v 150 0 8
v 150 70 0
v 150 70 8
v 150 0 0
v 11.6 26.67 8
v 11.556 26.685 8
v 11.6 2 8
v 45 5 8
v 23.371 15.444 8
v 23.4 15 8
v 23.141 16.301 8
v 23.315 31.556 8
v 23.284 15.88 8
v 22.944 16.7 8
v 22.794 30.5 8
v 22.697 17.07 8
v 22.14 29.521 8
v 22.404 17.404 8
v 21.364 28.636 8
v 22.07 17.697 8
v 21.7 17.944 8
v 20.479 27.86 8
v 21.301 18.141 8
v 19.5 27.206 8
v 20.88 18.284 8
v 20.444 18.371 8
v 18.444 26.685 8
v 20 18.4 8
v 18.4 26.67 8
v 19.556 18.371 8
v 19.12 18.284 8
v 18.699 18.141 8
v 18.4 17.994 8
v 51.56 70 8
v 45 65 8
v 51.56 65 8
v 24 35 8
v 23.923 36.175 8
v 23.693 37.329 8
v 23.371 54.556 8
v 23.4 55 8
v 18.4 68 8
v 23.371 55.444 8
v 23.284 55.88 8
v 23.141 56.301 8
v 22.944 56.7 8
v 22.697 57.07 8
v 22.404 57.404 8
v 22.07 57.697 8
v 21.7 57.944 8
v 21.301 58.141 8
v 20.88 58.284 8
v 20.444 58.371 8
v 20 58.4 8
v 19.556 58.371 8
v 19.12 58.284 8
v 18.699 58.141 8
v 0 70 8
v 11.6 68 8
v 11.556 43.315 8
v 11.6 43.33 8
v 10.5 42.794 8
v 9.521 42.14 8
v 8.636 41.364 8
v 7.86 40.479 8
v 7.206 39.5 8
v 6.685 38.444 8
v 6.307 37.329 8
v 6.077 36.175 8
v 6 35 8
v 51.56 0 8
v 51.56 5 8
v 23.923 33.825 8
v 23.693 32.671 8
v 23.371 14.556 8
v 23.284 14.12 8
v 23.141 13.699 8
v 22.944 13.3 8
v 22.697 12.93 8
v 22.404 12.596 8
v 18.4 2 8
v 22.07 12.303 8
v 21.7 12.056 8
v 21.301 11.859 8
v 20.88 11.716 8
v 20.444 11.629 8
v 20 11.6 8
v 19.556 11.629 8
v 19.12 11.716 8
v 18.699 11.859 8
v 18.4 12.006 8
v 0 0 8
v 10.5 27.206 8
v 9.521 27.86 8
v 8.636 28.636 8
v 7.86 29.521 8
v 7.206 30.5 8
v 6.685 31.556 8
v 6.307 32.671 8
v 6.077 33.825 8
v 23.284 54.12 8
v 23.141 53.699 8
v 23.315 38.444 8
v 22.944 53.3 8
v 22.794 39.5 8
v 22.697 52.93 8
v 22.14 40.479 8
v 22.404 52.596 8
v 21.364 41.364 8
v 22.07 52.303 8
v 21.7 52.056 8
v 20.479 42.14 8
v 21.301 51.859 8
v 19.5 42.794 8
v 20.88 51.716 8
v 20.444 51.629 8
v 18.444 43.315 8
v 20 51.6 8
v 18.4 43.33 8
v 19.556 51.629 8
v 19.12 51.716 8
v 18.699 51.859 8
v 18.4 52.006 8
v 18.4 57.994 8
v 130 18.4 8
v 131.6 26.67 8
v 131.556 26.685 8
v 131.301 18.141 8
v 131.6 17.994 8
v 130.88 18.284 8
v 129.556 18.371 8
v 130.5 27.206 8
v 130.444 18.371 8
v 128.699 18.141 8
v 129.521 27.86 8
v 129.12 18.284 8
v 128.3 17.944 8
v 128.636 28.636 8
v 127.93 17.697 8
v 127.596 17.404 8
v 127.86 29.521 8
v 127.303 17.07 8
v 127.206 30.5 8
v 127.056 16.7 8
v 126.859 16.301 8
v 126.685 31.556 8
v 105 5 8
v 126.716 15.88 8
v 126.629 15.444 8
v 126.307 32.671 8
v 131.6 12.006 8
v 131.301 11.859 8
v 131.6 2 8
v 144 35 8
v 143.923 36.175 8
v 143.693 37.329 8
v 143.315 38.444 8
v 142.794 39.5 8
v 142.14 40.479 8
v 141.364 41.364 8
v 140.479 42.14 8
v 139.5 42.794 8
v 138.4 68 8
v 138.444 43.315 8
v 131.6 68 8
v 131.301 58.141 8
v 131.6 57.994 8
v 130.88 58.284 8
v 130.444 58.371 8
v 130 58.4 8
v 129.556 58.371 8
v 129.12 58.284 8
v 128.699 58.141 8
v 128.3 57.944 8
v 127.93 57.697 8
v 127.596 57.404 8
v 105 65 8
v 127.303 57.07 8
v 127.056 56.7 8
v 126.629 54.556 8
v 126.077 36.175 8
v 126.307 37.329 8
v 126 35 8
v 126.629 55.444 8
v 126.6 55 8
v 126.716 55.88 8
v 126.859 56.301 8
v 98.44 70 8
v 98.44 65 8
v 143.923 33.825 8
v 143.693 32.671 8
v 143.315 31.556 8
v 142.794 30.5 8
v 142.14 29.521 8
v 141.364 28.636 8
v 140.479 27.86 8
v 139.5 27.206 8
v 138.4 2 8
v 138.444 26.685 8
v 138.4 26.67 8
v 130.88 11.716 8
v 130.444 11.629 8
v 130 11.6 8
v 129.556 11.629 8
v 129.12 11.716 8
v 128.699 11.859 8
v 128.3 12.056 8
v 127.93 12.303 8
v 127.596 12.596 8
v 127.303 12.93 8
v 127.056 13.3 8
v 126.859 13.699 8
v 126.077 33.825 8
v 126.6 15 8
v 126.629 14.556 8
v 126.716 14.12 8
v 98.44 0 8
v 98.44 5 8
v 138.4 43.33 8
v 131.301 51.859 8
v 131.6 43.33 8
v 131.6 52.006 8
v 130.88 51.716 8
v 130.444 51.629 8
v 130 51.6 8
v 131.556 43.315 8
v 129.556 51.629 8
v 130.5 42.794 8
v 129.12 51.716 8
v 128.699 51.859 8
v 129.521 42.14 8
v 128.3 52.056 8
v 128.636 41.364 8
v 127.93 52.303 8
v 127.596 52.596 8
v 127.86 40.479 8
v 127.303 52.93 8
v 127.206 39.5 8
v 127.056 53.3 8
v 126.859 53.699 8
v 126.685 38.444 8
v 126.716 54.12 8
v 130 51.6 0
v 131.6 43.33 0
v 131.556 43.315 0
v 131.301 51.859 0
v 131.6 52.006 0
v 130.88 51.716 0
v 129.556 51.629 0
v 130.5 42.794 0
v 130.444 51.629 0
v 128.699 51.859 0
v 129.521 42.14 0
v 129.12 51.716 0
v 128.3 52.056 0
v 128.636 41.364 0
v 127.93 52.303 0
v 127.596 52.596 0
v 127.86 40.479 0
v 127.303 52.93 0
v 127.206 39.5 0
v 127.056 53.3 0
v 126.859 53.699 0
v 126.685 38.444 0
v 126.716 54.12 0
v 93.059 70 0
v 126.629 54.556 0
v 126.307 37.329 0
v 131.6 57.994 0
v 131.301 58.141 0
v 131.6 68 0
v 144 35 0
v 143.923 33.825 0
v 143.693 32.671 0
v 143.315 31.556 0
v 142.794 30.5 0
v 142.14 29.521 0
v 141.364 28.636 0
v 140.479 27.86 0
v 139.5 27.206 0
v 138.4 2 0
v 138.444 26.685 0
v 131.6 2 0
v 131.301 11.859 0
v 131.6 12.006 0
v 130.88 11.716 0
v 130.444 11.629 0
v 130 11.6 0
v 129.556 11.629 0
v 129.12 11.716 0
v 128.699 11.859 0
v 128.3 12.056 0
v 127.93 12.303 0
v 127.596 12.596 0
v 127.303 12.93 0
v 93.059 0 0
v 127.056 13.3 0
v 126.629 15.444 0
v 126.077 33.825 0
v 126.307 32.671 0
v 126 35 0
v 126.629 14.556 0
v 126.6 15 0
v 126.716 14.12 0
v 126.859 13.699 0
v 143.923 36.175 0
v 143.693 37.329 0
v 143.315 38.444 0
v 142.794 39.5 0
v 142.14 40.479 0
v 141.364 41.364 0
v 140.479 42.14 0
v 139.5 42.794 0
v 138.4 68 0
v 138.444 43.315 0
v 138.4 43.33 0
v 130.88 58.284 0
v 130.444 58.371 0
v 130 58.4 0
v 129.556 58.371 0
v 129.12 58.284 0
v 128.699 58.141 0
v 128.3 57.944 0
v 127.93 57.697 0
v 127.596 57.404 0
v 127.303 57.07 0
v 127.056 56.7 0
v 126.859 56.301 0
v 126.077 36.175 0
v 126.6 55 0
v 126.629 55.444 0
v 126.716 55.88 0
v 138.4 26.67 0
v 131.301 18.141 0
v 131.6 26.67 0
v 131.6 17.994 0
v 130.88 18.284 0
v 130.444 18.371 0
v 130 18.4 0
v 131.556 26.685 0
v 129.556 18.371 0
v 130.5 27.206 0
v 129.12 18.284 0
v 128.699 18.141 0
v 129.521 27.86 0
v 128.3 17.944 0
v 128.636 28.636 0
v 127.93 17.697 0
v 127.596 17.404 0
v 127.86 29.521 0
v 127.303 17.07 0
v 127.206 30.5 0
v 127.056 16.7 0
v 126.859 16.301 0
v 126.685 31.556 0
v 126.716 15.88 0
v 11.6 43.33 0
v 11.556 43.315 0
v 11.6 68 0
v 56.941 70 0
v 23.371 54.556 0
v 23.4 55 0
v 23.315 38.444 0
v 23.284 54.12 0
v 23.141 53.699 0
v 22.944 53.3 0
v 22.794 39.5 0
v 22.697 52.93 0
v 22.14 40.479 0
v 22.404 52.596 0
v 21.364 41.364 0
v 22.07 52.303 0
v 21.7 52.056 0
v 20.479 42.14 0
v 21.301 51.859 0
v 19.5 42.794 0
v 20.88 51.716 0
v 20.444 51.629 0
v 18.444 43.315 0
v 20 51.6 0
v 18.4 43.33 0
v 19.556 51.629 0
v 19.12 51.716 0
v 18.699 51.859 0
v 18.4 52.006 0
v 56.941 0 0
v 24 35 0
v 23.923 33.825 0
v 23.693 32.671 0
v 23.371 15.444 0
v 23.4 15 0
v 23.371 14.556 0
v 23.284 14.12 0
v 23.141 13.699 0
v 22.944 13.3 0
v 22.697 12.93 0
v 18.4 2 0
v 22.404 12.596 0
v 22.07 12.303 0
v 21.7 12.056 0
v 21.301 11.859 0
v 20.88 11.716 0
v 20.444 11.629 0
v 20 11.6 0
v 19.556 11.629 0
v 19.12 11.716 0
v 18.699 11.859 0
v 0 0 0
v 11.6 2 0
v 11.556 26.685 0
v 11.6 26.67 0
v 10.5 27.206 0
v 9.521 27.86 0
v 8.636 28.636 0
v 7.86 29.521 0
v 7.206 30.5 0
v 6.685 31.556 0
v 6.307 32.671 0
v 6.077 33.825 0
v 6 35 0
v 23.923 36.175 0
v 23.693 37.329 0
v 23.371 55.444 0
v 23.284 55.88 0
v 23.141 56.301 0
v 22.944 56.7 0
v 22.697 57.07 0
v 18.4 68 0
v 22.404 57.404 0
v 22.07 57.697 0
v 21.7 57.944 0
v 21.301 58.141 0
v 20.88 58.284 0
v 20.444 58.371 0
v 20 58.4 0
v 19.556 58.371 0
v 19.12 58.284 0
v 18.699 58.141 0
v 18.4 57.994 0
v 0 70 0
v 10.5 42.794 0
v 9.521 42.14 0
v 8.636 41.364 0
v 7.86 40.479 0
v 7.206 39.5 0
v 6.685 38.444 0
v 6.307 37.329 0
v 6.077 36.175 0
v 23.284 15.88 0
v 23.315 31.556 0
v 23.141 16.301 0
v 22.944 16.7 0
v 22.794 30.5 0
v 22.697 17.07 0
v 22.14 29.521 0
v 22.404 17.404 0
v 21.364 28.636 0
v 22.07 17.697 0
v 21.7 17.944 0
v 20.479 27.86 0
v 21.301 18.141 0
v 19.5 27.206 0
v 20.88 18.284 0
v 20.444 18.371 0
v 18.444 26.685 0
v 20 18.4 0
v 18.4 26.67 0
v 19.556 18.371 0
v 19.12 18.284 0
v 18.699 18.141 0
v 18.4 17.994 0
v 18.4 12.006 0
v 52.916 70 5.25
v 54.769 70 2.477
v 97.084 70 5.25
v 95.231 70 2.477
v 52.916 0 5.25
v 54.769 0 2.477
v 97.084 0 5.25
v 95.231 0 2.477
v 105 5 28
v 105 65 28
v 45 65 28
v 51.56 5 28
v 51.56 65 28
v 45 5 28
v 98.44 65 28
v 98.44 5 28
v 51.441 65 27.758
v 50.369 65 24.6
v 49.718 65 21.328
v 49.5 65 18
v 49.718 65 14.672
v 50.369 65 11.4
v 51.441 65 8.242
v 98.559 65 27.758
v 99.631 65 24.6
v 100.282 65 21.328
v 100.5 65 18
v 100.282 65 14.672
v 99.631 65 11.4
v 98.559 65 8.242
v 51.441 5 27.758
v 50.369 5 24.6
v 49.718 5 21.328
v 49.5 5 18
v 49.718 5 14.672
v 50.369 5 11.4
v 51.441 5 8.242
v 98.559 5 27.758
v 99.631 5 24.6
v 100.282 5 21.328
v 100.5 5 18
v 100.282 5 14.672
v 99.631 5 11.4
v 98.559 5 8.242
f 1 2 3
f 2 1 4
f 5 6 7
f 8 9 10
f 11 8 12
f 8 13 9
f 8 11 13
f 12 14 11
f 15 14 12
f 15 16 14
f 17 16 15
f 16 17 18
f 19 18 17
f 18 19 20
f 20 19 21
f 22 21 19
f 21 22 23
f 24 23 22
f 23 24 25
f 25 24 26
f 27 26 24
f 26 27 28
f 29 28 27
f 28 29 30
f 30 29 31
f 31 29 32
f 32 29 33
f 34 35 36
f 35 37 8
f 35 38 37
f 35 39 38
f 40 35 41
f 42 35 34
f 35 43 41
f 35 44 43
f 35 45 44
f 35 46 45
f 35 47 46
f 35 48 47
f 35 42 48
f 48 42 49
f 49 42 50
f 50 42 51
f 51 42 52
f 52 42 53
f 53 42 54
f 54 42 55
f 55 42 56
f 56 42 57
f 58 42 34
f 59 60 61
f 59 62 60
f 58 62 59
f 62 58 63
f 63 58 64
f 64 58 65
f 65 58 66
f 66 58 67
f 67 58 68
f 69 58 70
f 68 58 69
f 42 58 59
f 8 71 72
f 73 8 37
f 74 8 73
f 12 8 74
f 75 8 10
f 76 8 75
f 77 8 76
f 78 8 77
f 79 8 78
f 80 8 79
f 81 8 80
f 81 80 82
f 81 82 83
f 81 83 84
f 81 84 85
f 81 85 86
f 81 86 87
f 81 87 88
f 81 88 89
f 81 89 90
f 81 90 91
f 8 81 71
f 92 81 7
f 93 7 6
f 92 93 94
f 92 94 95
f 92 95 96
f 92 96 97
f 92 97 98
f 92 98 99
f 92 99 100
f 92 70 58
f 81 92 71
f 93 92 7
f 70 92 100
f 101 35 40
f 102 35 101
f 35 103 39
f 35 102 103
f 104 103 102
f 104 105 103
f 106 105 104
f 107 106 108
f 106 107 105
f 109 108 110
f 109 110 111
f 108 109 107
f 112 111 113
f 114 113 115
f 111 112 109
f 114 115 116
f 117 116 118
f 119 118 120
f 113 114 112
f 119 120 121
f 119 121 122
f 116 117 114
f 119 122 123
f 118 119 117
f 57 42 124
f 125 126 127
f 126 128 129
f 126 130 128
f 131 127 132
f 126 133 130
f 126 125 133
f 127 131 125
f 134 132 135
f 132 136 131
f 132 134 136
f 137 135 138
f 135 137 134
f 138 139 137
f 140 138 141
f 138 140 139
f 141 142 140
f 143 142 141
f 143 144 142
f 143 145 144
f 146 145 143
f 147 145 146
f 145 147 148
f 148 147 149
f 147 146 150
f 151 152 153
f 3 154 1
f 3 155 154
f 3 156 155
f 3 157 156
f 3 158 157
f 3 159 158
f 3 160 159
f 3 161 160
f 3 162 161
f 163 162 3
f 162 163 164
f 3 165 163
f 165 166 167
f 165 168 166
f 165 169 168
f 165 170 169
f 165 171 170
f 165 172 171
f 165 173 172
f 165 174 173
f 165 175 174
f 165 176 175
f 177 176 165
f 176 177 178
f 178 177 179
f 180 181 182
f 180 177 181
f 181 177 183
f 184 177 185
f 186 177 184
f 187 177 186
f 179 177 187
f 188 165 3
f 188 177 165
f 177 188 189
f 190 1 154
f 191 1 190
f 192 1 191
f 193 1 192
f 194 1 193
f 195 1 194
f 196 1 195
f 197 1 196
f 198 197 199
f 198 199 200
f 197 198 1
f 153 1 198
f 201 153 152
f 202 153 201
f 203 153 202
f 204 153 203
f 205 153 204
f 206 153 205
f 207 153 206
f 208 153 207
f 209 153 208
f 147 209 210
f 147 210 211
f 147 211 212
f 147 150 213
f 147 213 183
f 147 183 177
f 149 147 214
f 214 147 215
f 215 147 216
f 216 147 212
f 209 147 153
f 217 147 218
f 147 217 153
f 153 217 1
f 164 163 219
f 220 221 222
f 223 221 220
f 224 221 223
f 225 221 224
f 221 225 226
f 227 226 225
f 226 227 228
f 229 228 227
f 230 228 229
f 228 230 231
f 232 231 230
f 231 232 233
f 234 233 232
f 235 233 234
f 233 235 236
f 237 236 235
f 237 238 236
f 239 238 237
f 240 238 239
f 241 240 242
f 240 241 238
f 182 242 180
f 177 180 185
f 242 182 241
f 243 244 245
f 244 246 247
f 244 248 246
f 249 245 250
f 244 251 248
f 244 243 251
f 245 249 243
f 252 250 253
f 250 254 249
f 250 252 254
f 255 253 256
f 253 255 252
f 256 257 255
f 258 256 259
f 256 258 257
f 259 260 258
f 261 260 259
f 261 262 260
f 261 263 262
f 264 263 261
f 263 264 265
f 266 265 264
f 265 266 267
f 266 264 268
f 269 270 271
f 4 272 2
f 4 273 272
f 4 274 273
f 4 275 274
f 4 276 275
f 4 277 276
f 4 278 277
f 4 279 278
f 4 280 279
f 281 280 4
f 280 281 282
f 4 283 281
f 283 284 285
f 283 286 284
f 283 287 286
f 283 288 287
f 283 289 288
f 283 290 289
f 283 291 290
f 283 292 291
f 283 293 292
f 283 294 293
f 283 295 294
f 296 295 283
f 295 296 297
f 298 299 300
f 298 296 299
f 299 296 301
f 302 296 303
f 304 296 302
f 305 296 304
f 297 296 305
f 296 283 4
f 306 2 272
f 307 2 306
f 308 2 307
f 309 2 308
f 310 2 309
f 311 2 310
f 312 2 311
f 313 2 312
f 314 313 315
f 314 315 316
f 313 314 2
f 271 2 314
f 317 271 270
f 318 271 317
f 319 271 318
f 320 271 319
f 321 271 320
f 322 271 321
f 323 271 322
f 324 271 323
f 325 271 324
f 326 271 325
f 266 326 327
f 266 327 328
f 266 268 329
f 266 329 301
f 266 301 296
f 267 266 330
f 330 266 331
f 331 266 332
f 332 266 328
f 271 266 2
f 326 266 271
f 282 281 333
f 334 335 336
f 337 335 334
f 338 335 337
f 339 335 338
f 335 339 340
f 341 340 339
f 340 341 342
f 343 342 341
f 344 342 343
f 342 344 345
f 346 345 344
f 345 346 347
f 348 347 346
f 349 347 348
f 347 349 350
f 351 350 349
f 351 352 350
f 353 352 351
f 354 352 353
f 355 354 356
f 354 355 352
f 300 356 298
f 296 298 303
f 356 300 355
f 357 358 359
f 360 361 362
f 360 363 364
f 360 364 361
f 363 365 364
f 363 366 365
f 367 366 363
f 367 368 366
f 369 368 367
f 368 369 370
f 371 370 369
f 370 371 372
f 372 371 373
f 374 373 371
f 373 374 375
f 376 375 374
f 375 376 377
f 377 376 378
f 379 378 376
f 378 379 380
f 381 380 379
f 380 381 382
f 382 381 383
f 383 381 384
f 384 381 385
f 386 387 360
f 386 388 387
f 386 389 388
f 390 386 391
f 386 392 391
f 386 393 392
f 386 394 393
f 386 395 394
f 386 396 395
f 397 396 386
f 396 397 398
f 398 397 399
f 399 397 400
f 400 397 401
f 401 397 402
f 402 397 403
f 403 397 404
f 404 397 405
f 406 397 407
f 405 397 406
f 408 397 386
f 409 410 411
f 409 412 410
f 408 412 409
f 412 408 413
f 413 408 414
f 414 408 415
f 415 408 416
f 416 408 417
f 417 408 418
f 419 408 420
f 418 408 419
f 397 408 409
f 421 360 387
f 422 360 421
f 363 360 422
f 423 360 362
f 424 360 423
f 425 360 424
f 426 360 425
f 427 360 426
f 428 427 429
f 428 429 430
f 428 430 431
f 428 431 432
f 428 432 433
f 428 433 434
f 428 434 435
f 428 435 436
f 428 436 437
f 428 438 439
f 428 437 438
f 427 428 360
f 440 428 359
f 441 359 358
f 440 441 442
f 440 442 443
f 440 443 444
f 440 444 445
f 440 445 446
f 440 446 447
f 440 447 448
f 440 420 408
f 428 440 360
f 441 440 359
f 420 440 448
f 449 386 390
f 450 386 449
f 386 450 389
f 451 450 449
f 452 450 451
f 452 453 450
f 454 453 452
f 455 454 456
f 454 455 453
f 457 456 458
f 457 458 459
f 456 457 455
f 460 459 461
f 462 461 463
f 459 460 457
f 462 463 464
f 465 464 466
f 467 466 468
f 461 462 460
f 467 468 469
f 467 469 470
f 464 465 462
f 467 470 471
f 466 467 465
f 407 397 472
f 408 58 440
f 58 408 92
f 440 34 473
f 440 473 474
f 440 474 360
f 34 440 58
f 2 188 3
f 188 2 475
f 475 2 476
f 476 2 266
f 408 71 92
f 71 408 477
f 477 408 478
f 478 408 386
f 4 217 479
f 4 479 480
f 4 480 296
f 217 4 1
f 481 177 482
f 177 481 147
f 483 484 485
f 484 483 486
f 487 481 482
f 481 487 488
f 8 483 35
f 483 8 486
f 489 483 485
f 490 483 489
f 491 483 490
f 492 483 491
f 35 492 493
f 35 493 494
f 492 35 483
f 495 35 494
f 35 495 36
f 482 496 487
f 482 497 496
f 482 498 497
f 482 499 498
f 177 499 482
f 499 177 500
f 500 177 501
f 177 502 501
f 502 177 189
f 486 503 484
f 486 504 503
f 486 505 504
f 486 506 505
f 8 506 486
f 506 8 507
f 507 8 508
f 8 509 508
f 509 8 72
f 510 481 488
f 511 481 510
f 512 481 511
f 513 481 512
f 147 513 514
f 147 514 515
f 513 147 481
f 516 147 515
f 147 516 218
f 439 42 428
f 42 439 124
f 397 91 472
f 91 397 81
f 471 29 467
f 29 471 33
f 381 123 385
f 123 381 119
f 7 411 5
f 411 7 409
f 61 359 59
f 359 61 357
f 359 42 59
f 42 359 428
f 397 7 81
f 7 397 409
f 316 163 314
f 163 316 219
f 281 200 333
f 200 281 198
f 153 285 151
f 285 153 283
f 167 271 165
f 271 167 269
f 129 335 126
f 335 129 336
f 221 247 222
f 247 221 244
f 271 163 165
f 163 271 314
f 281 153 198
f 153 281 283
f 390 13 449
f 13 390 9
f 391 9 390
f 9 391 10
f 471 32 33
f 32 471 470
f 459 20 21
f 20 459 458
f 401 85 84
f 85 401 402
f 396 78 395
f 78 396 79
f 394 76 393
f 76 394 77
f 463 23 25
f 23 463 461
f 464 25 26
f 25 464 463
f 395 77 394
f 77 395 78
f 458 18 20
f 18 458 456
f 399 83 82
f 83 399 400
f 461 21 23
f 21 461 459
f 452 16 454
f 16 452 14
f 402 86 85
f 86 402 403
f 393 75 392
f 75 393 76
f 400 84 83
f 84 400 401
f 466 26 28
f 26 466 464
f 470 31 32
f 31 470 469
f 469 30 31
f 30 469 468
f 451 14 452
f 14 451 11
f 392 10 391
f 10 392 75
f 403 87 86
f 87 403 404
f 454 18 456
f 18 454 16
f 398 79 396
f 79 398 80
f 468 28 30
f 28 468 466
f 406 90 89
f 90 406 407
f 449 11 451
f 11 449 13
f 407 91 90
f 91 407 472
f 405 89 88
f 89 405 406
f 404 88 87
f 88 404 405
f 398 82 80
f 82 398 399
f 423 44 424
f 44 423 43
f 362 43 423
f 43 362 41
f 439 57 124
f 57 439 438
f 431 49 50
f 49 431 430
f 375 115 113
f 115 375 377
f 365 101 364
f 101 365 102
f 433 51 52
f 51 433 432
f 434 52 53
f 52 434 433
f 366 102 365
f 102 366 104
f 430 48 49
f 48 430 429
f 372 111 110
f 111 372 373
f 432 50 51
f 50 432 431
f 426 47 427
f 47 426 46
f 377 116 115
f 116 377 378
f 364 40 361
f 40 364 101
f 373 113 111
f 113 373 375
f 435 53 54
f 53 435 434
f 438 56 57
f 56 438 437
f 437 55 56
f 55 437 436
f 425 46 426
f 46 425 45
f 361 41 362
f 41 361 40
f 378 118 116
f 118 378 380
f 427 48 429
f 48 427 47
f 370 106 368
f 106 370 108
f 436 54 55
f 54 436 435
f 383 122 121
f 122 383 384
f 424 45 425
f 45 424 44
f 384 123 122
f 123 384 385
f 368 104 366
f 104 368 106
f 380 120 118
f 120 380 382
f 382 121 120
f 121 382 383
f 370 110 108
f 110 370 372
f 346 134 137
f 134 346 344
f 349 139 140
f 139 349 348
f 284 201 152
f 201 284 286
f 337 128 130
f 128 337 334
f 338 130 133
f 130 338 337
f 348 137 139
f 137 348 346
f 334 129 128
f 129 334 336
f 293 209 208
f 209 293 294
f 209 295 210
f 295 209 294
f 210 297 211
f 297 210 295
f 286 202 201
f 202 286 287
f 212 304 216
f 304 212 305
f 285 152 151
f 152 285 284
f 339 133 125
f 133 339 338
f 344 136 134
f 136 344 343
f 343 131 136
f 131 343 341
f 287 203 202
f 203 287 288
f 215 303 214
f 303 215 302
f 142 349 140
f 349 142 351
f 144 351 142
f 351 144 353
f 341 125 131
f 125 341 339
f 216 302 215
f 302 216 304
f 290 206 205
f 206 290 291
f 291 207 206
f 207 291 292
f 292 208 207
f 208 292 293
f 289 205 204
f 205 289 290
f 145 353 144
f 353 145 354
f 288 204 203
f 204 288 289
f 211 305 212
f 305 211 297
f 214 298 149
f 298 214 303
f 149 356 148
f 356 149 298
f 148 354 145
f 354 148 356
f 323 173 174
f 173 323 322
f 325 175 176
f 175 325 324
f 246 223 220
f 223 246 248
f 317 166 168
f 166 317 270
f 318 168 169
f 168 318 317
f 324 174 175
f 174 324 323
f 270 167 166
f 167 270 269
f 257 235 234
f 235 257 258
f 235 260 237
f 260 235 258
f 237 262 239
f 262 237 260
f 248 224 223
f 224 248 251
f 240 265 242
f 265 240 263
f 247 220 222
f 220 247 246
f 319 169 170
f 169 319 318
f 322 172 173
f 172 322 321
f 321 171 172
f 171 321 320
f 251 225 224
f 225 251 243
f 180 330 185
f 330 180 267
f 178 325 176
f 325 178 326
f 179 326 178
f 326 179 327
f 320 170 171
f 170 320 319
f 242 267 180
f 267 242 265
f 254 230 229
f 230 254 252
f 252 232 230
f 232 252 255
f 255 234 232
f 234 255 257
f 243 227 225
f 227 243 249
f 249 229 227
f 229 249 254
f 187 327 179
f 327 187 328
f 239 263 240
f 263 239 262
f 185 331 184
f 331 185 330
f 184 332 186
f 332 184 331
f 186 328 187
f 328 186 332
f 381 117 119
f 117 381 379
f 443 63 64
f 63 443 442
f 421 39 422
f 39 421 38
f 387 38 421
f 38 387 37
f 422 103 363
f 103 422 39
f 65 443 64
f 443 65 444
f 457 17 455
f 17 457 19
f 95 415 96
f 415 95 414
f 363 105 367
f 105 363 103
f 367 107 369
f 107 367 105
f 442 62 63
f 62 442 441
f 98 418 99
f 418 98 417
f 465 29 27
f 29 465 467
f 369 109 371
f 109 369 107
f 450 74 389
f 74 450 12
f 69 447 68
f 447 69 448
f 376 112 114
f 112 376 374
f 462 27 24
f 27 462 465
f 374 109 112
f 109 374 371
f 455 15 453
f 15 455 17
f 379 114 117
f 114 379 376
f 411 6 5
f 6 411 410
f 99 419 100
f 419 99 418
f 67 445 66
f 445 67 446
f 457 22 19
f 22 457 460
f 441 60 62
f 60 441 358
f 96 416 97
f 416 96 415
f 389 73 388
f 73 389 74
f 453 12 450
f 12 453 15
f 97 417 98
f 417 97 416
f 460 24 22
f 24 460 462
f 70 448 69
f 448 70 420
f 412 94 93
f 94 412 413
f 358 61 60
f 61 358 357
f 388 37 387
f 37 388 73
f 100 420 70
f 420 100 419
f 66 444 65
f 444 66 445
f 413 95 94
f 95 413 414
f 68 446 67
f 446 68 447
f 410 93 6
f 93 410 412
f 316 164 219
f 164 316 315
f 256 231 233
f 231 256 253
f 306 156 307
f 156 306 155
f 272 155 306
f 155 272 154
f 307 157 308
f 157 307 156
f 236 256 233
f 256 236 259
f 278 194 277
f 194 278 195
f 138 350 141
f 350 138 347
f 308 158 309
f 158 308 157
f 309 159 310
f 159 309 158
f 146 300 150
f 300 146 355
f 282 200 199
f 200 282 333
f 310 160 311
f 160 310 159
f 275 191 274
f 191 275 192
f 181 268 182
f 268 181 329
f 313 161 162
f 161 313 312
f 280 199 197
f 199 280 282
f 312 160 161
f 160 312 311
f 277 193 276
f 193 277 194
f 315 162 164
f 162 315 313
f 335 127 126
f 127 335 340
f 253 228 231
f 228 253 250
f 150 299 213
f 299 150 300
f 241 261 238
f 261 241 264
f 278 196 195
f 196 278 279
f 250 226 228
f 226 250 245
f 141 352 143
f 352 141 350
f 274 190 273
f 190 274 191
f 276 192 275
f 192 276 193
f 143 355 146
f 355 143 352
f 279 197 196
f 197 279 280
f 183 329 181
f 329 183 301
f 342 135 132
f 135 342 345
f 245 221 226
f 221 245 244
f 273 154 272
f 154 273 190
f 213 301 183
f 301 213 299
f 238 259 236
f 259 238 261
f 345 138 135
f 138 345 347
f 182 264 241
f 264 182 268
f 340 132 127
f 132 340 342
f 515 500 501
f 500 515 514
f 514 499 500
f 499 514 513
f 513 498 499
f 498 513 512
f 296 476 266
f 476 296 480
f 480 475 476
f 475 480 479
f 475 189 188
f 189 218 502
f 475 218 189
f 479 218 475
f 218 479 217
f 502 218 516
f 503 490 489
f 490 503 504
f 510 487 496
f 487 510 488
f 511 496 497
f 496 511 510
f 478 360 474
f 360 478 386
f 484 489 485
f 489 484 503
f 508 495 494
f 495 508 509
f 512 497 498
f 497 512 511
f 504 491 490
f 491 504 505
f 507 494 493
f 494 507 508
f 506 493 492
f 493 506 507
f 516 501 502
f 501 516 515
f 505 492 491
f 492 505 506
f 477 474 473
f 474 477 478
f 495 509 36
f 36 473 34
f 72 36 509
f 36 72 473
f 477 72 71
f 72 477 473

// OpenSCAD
/*
 * mounting_brackets.scad
 * Mounting Brackets for Common-Mode Choke Enclosures
 * TM-CMC-001 Rev A
 * Material: ASA (outdoor) or PETG (indoor only)
 * Print bed: 200 × 200 mm; all parts fit without support
 *
 * Bracket types:
 *   1. U-bolt mast bracket (1"–2.5" mast, adjustable)
 *   2. Flat surface / wall mount bracket with cable routing
 *   3. Tower climbing bracket (clamp-on step bolt style)
 *   4. Coax strain relief clamp (for feedline at choke entry)
 *   5. Ferrite stack retainer clip (keeps stacked toroids aligned)
 *   6. Snap-on bead rail (holds 8–12 beads in line on coax)
 */

$fn = 48;

D_M4   = 4.5;
D_M4_HS= 6.5;
D_M6   = 6.8;
D_M8   = 8.5;

// ── 1. U-BOLT MAST BRACKET ────────────────────────────────────────────────────
// Attaches the choke enclosure (or bare coil) to a round mast.
// Accommodates mast diameter 25mm (1") to 63mm (2.5").
// Two M6 U-bolts thread through slots; tighten with wing nuts for field use.
// Enclosure mounts to top face via 4× M6 bolts matching flange pattern.

module ubolt_mast_bracket(mast_d = 50) {
    PLATE_L = 150;
    PLATE_W = 70;
    PLATE_T = 8;
    SADDLE_H = 20;
    BOLT_PITCH_X = 120;   // spacing between U-bolt legs
    ENC_BOLT_PITCH = 110; // must match enclosure flange M6 pattern

    difference() {
        union() {
            // Flat back plate
            cube([PLATE_L, PLATE_W, PLATE_T]);
            // Mast saddle boss (extends inward)
            translate([PLATE_L/2 - mast_d/2 - 5, PLATE_W/2 - mast_d/2 - 5, PLATE_T])
                cube([mast_d + 10, mast_d + 10, SADDLE_H]);
        }

        // Mast cutout (semi-cylinder into saddle)
        translate([PLATE_L/2, -0.1, PLATE_T + SADDLE_H/2])
            rotate([-90, 0, 0])
            cylinder(d=mast_d + 1.0, h=PLATE_W + 0.2);

        // U-bolt slots (×2, centered on mast center)
        for (dx=[-BOLT_PITCH_X/2, BOLT_PITCH_X/2])
            translate([PLATE_L/2 + dx - D_M6/2, PLATE_W/2 - mast_d/2 - 8, -0.1])
                cube([D_M6, mast_d + 16, PLATE_T + 0.2]);

        // Enclosure mounting holes ×4
        for (pos=[[(PLATE_L-ENC_BOLT_PITCH)/2,    15],
                  [(PLATE_L-ENC_BOLT_PITCH)/2,    PLATE_W-15],
                  [(PLATE_L+ENC_BOLT_PITCH)/2,    15],
                  [(PLATE_L+ENC_BOLT_PITCH)/2,    PLATE_W-15]])
            translate([pos[0], pos[1], -0.1])
                cylinder(d=D_M6, h=PLATE_T+0.2);

        // Lightening holes
        for (x=[15, PLATE_L-15])
            translate([x, PLATE_W/2, -0.1])
                cylinder(d=18, h=PLATE_T+0.2);

        // Corner cable tie slots (route coax along bracket)
        for (y=[5, PLATE_W-5])
            translate([PLATE_L/2-1, y-2, -0.1])
                cube([2, 4, PLATE_T+0.2]);
    }
}

// ── 2. FLAT SURFACE / WALL MOUNT BRACKET ─────────────────────────────────────
// L-bracket for mounting choke enclosure on flat surface (wall, roof penetration,
// equipment rack, or field-day table edge).
// Horizontal arm: attaches to enclosure
// Vertical arm: attaches to wall with M6 lag bolts or anchors

module wall_mount_bracket() {
    H_ARM_L = 100;   // horizontal arm length
    V_ARM_L = 100;   // vertical arm length
    ARM_W   =  70;
    ARM_T   =   8;
    GUSSET  =  30;

    union() {
        // Horizontal arm
        difference() {
            cube([H_ARM_L, ARM_W, ARM_T]);
            // 4× M6 holes for enclosure attachment
            for (pos=[[15,15],[15,ARM_W-15],[H_ARM_L-15,15],[H_ARM_L-15,ARM_W-15]])
                translate([pos[0], pos[1], -0.1]) cylinder(d=D_M6, h=ARM_T+0.2);
        }

        // Vertical arm
        translate([H_ARM_L, 0, 0])
        rotate([0, -90, 0])
        difference() {
            cube([V_ARM_L, ARM_W, ARM_T]);
            // 4× M6 lag holes for wall
            for (pos=[[15,15],[15,ARM_W-15],[V_ARM_L-15,15],[V_ARM_L-15,ARM_W-15]])
                translate([pos[0], pos[1], -0.1]) cylinder(d=D_M6, h=ARM_T+0.2);
        }

        // Diagonal gusset
        translate([H_ARM_L-GUSSET, 0, ARM_T])
            linear_extrude(height=ARM_W)
                polygon([[0,0],[GUSSET,0],[0,GUSSET]]);
    }
}

// ── 3. TOWER CLAMP BRACKET ────────────────────────────────────────────────────
// Sandwiches between tower steps or clamps to tower angle iron leg.
// Designed for standard rohn/DMX tower step spacing.
// Adjustable jaw: opens 25–75mm for various tower leg widths.

module tower_clamp_bracket() {
    CLAMP_L = 120;
    CLAMP_H =  50;
    CLAMP_T =  10;
    JAW_D   =  50;  // maximum tower leg opening

    difference() {
        union() {
            cube([CLAMP_L, CLAMP_H, CLAMP_T]);
            // Enclosure mounting boss (top face)
            translate([CLAMP_L/2-30, CLAMP_H/2-15, CLAMP_T])
                cube([60, 30, 10]);
        }
        // Tower clamp jaw slot (center)
        translate([CLAMP_L/2-5, -0.1, CLAMP_T/2])
            cube([10, CLAMP_H/2+1, CLAMP_T]);

        // Clamping bolt hole M8 (through jaw)
        translate([CLAMP_L/2, -0.1, CLAMP_T/2])
            rotate([-90,0,0]) cylinder(d=D_M8, h=CLAMP_H+0.2);

        // Enclosure mounting ×4 M6
        for (pos=[[CLAMP_L/2-20, CLAMP_H/2-7],
                  [CLAMP_L/2-20, CLAMP_H/2+7],
                  [CLAMP_L/2+20, CLAMP_H/2-7],
                  [CLAMP_L/2+20, CLAMP_H/2+7]])
            translate([pos[0], pos[1], CLAMP_T-0.1]) cylinder(d=D_M6, h=11);

        // Lightening cutouts
        for (x=[10, CLAMP_L-30])
            translate([x, 10, -0.1]) cube([20, CLAMP_H-20, CLAMP_T+0.2]);
    }
}

// ── 4. COAX STRAIN RELIEF CLAMP ───────────────────────────────────────────────
// Clamps coax cable securely at choke enclosure entry port.
// Prevents pulling force on connector from vibration or cable weight.
// Two-piece: lower clamp (prints with enclosure or separately) + upper cap.
// Fits RG-8X (8.4mm OD) or RG-58 (5mm OD).

module strain_relief_lower(coax_d = 8.4) {
    CLAMP_L = 40;
    CLAMP_W = 25;
    CLAMP_H = 12;
    difference() {
        cube([CLAMP_L, CLAMP_W, CLAMP_H]);
        // Coax groove (half-cylinder)
        translate([CLAMP_L/2, -0.1, CLAMP_H/2])
            rotate([-90,0,0]) cylinder(d=coax_d+0.5, h=CLAMP_W+0.2);
        // M4 screw holes ×2
        for (x=[8, CLAMP_L-8])
            translate([x, CLAMP_W/2, -0.1]) cylinder(d=D_M4, h=CLAMP_H+0.2);
    }
}

module strain_relief_upper(coax_d = 8.4) {
    CLAMP_L = 40;
    CLAMP_W = 25;
    CLAMP_H =  8;
    difference() {
        cube([CLAMP_L, CLAMP_W, CLAMP_H]);
        // Coax groove
        translate([CLAMP_L/2, -0.1, 0])
            rotate([-90,0,0]) cylinder(d=coax_d+0.5, h=CLAMP_W+0.2);
        // M4 clearance holes + countersink
        for (x=[8, CLAMP_L-8]) {
            translate([x, CLAMP_W/2, -0.1]) cylinder(d=D_M4, h=CLAMP_H+0.2);
            translate([x, CLAMP_W/2, CLAMP_H-3.5]) cylinder(d1=D_M4, d2=9, h=3.6);
        }
    }
}

// ── 5. FERRITE STACK RETAINER CLIP ────────────────────────────────────────────
// Keeps two stacked FT-240 cores aligned and prevents separation.
// Snaps over both cores; cable tie slot at each end.
// Print 2 per choke (top + bottom of core stack).

module core_retainer_clip() {
    CORE_OD  = 61.5;  // FT-240 OD + 0.5mm clearance
    CLIP_W   = 15;
    CLIP_T   =  4;
    STACK_H  = 28;    // two FT-240 cores stacked (12.7mm × 2 + 2.6mm tape)
    ARM_L    = CORE_OD/2 + CLIP_T + 5;

    union() {
        // Bottom arc (lower core retention)
        rotate_extrude(angle=210)
            translate([CORE_OD/2, 0, 0])
                square([CLIP_T, CLIP_W]);

        // Two arms extending past 210° to form snap-over tabs
        for (a=[0, 210])
            rotate([0, 0, a])
                translate([CORE_OD/2, 0, 0])
                    cube([ARM_L, CLIP_T, CLIP_W]);

        // Cable tie slots at arm ends
        for (a=[0, 210])
            rotate([0, 0, a])
                translate([ARM_L + CORE_OD/2 - 3, CLIP_T/2-1.5, CLIP_W/2-4])
                    cube([3, 3, 8]);
    }
}

// ── 6. SNAP-ON BEAD RAIL ──────────────────────────────────────────────────────
// Holds a stack of snap-on split ferrite beads in a neat row on coax cable.
// Channel accepts beads from above; cable passes through from end.
// Mounts to flat surface or wraps with hook-and-loop strap.

module bead_rail(n_beads=8, bead_w=28.6, bead_h=28.6, coax_d=8.4) {
    RAIL_T = 5;
    RAIL_W = bead_h + 2*RAIL_T;
    RAIL_L = n_beads * (bead_w + 1) + 2*RAIL_T;

    difference() {
        cube([RAIL_L, RAIL_W, RAIL_T + bead_h/2]);

        // Coax channel through rail (lengthwise, centers at mid-height)
        translate([-0.1, RAIL_W/2, RAIL_T + bead_h/2])
            rotate([0, 90, 0])
            cylinder(d=coax_d+1.0, h=RAIL_L+0.2);

        // Bead pockets (top-open channels for each bead)
        for (i=[0:n_beads-1])
            translate([RAIL_T + i*(bead_w+1), RAIL_T, RAIL_T])
                cube([bead_w, bead_h, bead_h/2+0.1]);

        // Mounting slot ×2 (tie-wrap or M4 bolt)
        for (x=[10, RAIL_L-10])
            translate([x-2, RAIL_W/2-2, -0.1])
                cube([4, 4, RAIL_T+0.2]);
    }

    // Retainer lips at top of each bead pocket (flex-snap)
    for (i=[0:n_beads-1]) {
        for (side=[0,1]) {
            translate([RAIL_T + i*(bead_w+1) + side*(bead_w-4),
                       RAIL_T - 1.5, RAIL_T + bead_h/2 - 3])
                cube([4, 1.5, 5]);
        }
    }
}

// ── Render (one item at a time; uncomment to print) ──────────────────────────
ubolt_mast_bracket(mast_d=50);    // 1.97" mast (common); change to mast_d=38 for 1.5"
// translate([160, 0, 0]) wall_mount_bracket();
// translate([0, 160, 0]) tower_clamp_bracket();
// translate([160, 160, 0]) strain_relief_lower(coax_d=8.4);
// translate([160, 140, 15]) strain_relief_upper(coax_d=8.4);
// translate([0, 80, 0]) core_retainer_clip();
// translate([0, 0, 20]) bead_rail(n_beads=8, bead_w=28.6, bead_h=28.6, coax_d=8.4);
